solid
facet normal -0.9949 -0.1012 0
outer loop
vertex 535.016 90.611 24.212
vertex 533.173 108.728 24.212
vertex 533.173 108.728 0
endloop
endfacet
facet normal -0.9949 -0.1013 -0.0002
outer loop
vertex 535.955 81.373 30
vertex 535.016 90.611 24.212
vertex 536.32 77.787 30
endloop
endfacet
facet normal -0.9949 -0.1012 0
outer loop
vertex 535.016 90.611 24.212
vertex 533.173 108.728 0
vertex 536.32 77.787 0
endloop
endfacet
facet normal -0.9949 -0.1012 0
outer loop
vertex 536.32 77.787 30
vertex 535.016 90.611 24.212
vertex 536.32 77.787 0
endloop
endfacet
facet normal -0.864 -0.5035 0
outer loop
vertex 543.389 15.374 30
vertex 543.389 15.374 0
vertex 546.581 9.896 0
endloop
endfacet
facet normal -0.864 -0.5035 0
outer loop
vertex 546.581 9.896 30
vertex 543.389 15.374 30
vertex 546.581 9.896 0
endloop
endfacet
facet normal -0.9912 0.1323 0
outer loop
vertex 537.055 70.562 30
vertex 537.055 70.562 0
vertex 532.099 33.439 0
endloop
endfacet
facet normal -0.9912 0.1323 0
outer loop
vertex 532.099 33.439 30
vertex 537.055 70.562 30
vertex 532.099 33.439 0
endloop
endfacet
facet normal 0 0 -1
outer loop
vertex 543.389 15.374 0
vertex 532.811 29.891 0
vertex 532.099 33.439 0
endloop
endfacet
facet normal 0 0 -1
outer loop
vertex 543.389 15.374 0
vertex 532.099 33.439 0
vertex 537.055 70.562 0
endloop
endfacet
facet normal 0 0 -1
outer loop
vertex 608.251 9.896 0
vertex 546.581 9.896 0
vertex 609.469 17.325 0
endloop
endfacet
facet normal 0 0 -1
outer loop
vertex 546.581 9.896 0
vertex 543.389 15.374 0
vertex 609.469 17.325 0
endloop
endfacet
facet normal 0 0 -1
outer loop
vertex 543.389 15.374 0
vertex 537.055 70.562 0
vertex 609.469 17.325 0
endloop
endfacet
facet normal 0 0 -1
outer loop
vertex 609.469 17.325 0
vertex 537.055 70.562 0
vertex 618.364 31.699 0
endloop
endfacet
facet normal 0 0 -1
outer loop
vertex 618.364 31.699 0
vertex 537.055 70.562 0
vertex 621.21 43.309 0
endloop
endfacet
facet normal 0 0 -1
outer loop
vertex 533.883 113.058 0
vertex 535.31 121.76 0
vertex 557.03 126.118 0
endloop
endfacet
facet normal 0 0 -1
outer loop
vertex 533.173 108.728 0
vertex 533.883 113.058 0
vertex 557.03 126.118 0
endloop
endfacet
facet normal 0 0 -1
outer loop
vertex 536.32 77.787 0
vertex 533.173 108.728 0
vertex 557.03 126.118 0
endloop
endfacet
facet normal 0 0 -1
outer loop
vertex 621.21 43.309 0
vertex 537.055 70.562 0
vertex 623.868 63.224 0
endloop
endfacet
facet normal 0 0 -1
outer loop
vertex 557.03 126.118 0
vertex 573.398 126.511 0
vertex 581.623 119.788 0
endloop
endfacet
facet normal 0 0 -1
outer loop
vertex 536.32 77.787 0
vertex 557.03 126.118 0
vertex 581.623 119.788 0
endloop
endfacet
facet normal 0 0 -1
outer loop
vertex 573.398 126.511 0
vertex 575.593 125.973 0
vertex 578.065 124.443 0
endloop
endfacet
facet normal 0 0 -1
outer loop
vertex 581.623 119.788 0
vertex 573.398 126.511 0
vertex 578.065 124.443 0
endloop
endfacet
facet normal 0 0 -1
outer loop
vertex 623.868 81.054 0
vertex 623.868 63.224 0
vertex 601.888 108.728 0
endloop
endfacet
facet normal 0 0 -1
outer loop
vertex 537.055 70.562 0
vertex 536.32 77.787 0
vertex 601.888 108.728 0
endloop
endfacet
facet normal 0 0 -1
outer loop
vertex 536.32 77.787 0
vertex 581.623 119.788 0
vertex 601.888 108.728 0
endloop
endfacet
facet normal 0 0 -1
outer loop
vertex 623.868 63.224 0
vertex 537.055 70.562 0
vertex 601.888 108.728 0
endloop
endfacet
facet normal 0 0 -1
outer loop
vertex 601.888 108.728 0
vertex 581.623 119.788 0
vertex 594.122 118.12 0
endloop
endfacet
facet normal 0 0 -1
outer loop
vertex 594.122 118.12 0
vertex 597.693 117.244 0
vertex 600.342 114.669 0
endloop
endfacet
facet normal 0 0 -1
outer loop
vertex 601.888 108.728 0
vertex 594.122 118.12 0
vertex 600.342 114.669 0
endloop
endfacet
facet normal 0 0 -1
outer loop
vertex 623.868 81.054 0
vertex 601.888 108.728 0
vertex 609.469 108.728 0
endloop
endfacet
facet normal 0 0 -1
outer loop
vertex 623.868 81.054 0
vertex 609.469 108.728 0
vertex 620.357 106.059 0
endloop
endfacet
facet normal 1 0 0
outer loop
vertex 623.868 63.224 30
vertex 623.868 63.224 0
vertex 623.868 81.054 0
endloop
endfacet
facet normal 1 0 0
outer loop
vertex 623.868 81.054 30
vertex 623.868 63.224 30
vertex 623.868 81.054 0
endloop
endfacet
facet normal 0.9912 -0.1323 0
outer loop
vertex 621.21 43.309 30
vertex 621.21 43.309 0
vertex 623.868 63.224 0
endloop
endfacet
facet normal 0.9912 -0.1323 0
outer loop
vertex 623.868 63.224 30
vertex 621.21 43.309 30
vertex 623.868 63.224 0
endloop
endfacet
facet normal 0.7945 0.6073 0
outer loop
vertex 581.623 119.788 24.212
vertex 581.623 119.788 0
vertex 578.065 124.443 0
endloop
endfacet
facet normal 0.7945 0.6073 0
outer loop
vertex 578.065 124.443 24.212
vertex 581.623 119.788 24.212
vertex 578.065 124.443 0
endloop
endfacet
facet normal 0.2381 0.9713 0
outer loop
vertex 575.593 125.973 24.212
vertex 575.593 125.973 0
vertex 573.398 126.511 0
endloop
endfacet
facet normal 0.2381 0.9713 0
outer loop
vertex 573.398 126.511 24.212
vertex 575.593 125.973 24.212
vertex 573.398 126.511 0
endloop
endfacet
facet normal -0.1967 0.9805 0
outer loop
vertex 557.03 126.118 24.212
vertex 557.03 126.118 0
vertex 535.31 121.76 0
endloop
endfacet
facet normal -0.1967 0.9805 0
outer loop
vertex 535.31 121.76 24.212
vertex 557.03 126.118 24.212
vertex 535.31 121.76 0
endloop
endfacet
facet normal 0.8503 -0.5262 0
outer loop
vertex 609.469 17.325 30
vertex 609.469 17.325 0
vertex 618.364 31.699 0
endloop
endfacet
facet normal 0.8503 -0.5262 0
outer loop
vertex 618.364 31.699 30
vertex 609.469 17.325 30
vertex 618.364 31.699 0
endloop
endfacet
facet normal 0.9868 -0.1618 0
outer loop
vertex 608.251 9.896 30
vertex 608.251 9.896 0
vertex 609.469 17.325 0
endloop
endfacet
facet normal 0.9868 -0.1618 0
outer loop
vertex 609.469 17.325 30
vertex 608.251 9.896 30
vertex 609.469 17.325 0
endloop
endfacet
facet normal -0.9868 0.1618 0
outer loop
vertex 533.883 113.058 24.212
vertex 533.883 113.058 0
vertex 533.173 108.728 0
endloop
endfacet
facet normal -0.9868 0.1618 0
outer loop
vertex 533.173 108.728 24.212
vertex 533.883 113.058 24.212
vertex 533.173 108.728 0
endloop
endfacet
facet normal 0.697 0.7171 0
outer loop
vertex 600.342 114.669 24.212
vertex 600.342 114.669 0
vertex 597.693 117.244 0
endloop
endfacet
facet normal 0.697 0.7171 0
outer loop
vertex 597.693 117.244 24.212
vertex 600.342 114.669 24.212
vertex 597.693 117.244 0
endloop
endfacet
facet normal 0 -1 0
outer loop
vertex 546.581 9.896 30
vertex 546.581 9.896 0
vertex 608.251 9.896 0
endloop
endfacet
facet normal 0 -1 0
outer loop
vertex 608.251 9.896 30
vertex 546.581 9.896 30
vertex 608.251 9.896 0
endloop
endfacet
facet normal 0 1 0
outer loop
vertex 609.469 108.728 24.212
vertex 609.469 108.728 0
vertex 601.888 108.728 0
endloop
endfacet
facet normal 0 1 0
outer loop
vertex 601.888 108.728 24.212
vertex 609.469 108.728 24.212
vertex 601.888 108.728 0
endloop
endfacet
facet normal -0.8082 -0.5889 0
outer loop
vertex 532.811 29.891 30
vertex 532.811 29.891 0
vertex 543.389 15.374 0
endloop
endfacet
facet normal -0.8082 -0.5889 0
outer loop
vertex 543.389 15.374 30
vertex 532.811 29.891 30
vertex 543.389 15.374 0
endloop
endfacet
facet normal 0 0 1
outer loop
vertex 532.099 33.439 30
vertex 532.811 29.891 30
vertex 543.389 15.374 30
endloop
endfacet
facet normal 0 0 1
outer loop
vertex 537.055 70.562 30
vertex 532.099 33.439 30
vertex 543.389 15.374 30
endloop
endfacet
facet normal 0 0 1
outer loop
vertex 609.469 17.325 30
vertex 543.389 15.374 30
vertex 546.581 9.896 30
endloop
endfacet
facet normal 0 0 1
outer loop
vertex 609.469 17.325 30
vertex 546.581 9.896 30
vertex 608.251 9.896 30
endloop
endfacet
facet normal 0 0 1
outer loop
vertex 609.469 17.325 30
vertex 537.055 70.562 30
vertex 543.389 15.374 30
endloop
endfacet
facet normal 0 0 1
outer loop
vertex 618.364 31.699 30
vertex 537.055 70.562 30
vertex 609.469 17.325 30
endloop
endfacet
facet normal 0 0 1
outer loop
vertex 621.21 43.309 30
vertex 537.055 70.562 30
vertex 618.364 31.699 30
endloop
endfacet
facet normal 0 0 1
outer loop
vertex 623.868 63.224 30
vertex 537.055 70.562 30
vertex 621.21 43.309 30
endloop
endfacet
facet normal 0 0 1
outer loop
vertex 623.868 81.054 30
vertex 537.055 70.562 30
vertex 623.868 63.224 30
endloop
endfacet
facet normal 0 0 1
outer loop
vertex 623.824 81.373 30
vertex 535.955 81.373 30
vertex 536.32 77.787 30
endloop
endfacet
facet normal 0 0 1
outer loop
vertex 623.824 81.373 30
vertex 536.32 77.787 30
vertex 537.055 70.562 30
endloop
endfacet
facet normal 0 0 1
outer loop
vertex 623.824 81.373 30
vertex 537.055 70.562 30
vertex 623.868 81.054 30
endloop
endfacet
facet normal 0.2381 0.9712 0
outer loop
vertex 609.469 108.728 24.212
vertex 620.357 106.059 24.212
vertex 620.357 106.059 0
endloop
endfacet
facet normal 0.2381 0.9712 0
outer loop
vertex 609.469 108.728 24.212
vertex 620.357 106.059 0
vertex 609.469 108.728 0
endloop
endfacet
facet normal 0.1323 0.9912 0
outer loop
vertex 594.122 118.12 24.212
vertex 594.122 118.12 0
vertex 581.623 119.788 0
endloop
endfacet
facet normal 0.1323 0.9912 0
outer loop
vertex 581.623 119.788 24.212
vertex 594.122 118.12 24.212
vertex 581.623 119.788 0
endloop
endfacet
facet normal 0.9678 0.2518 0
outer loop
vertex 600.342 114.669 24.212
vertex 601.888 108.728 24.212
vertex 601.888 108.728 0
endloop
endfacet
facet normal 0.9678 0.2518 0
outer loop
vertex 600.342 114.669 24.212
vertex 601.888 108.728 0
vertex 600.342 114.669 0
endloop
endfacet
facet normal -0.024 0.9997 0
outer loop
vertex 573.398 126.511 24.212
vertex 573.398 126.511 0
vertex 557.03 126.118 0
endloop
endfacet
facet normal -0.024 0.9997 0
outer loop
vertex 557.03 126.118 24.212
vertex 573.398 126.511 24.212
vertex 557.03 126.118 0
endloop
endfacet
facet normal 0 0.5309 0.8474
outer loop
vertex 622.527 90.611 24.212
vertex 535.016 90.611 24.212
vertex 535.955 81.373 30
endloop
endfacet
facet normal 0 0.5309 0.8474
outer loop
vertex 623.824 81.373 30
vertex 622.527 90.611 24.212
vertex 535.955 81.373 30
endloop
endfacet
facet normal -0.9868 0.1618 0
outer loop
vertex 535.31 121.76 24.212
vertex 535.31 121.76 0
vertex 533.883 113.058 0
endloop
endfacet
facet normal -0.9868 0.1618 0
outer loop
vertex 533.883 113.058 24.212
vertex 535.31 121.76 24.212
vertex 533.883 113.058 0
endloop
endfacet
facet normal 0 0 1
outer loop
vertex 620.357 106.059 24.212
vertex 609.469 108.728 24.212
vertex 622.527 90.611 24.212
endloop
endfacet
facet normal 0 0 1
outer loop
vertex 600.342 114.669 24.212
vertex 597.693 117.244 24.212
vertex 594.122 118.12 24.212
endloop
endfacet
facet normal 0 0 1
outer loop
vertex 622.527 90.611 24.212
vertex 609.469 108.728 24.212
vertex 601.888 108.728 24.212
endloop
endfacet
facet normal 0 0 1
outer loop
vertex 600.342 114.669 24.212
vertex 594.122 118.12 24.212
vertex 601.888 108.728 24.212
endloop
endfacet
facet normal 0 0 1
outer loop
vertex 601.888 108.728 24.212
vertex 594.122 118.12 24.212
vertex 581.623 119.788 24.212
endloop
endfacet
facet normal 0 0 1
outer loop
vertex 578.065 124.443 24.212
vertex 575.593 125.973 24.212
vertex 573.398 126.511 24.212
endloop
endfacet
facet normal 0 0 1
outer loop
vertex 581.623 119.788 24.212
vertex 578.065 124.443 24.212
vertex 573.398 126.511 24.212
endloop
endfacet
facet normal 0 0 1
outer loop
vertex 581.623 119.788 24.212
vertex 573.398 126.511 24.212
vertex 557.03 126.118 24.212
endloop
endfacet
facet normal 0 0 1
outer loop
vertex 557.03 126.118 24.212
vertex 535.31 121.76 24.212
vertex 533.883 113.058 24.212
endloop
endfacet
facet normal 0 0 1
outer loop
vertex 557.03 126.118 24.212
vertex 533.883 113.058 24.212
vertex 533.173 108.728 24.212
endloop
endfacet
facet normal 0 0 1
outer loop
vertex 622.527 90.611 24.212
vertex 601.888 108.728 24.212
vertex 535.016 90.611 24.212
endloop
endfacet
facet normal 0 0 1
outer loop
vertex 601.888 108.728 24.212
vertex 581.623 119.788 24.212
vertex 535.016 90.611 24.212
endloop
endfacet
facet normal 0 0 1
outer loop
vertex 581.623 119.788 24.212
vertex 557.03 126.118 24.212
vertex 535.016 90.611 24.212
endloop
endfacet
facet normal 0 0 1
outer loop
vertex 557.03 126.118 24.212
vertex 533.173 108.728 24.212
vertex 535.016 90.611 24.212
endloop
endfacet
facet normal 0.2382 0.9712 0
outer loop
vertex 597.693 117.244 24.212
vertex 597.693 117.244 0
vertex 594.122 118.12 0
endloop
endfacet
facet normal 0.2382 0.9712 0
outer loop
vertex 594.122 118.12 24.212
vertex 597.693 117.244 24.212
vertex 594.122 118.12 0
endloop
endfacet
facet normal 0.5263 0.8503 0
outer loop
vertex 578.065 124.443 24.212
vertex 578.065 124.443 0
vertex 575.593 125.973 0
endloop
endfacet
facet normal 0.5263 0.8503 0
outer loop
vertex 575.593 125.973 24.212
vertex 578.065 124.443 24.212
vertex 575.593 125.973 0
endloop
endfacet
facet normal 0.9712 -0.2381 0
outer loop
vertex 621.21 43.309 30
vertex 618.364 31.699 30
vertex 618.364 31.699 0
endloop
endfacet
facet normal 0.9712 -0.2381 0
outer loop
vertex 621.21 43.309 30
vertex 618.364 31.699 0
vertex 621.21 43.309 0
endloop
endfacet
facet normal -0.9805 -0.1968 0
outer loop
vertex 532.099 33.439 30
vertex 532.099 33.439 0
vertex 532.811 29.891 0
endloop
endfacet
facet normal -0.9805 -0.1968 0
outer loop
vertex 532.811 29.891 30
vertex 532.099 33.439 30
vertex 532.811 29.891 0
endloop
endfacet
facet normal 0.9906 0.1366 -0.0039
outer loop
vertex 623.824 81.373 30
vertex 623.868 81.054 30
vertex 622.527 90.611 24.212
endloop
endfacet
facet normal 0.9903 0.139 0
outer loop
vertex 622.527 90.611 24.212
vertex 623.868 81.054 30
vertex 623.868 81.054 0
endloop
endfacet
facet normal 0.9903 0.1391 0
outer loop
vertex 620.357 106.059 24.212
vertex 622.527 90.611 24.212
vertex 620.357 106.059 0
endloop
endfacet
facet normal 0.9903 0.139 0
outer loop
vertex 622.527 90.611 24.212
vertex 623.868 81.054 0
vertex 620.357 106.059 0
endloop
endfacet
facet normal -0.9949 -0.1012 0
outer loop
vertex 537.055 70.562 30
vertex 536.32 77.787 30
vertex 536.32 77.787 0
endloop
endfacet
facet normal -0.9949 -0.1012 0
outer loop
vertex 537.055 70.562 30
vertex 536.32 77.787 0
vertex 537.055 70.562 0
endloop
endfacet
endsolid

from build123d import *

# Parameters (mm, degrees)
BOSS_EXTRUDE1_DEPTH     = 30
CUT_EXTRUDE2_DEPTH      = 161.362841695
CUT_EXTRUDE2_DEPTH_BACK = 161.362841695


with BuildPart() as part:
    # Sketch1 → Boss-Extrude1 (new body)
    with BuildSketch(Plane.XY):
        Polygon((546.580924534, 9.896085679), (608.250924534, 9.896085679), (609.468725462, 17.325239217), (618.364062826, 31.698748766), (621.209508482, 43.308723045), (623.868380606, 63.224196603), (623.868380606, 81.054488799), (620.357339754, 106.059490311), (609.468725462, 108.728140515), (601.88762533, 108.728140515), (600.342350418, 114.668879106), (597.693307712, 117.244337292), (594.121848564, 118.119653006), (581.623216062, 119.788318601), (578.065152196, 124.442825109), (575.59297034, 125.972784898), (573.39799577, 126.510743097), (557.030037078, 126.118131563), (535.309704018, 121.76025213), (533.883150006, 113.057607434), (533.173455584, 108.728140515), (536.320171406, 77.786869686), (537.054893461, 70.562437811), (532.098682684, 33.439447285), (532.810591456, 29.891185826), (543.388975695, 15.373727724), align=None)
    extrude(amount=BOSS_EXTRUDE1_DEPTH)

    # Sketch2 → Cut-Extrude2 (cut, two sides: drawn at the far end of the back side and taken through both)
    with BuildSketch(Plane(origin=(530, 0, 0), x_dir=(0, 0, -1), z_dir=(1, 0, 0)).offset(-CUT_EXTRUDE2_DEPTH_BACK)):
        Polygon((-24.212, 126.510743097), (-24.212, 90.610743097), (-30, 81.373139386), (-30, 126.510743097), align=None)
    extrude(amount=CUT_EXTRUDE2_DEPTH + CUT_EXTRUDE2_DEPTH_BACK, mode=Mode.SUBTRACT)


solid = part.part
